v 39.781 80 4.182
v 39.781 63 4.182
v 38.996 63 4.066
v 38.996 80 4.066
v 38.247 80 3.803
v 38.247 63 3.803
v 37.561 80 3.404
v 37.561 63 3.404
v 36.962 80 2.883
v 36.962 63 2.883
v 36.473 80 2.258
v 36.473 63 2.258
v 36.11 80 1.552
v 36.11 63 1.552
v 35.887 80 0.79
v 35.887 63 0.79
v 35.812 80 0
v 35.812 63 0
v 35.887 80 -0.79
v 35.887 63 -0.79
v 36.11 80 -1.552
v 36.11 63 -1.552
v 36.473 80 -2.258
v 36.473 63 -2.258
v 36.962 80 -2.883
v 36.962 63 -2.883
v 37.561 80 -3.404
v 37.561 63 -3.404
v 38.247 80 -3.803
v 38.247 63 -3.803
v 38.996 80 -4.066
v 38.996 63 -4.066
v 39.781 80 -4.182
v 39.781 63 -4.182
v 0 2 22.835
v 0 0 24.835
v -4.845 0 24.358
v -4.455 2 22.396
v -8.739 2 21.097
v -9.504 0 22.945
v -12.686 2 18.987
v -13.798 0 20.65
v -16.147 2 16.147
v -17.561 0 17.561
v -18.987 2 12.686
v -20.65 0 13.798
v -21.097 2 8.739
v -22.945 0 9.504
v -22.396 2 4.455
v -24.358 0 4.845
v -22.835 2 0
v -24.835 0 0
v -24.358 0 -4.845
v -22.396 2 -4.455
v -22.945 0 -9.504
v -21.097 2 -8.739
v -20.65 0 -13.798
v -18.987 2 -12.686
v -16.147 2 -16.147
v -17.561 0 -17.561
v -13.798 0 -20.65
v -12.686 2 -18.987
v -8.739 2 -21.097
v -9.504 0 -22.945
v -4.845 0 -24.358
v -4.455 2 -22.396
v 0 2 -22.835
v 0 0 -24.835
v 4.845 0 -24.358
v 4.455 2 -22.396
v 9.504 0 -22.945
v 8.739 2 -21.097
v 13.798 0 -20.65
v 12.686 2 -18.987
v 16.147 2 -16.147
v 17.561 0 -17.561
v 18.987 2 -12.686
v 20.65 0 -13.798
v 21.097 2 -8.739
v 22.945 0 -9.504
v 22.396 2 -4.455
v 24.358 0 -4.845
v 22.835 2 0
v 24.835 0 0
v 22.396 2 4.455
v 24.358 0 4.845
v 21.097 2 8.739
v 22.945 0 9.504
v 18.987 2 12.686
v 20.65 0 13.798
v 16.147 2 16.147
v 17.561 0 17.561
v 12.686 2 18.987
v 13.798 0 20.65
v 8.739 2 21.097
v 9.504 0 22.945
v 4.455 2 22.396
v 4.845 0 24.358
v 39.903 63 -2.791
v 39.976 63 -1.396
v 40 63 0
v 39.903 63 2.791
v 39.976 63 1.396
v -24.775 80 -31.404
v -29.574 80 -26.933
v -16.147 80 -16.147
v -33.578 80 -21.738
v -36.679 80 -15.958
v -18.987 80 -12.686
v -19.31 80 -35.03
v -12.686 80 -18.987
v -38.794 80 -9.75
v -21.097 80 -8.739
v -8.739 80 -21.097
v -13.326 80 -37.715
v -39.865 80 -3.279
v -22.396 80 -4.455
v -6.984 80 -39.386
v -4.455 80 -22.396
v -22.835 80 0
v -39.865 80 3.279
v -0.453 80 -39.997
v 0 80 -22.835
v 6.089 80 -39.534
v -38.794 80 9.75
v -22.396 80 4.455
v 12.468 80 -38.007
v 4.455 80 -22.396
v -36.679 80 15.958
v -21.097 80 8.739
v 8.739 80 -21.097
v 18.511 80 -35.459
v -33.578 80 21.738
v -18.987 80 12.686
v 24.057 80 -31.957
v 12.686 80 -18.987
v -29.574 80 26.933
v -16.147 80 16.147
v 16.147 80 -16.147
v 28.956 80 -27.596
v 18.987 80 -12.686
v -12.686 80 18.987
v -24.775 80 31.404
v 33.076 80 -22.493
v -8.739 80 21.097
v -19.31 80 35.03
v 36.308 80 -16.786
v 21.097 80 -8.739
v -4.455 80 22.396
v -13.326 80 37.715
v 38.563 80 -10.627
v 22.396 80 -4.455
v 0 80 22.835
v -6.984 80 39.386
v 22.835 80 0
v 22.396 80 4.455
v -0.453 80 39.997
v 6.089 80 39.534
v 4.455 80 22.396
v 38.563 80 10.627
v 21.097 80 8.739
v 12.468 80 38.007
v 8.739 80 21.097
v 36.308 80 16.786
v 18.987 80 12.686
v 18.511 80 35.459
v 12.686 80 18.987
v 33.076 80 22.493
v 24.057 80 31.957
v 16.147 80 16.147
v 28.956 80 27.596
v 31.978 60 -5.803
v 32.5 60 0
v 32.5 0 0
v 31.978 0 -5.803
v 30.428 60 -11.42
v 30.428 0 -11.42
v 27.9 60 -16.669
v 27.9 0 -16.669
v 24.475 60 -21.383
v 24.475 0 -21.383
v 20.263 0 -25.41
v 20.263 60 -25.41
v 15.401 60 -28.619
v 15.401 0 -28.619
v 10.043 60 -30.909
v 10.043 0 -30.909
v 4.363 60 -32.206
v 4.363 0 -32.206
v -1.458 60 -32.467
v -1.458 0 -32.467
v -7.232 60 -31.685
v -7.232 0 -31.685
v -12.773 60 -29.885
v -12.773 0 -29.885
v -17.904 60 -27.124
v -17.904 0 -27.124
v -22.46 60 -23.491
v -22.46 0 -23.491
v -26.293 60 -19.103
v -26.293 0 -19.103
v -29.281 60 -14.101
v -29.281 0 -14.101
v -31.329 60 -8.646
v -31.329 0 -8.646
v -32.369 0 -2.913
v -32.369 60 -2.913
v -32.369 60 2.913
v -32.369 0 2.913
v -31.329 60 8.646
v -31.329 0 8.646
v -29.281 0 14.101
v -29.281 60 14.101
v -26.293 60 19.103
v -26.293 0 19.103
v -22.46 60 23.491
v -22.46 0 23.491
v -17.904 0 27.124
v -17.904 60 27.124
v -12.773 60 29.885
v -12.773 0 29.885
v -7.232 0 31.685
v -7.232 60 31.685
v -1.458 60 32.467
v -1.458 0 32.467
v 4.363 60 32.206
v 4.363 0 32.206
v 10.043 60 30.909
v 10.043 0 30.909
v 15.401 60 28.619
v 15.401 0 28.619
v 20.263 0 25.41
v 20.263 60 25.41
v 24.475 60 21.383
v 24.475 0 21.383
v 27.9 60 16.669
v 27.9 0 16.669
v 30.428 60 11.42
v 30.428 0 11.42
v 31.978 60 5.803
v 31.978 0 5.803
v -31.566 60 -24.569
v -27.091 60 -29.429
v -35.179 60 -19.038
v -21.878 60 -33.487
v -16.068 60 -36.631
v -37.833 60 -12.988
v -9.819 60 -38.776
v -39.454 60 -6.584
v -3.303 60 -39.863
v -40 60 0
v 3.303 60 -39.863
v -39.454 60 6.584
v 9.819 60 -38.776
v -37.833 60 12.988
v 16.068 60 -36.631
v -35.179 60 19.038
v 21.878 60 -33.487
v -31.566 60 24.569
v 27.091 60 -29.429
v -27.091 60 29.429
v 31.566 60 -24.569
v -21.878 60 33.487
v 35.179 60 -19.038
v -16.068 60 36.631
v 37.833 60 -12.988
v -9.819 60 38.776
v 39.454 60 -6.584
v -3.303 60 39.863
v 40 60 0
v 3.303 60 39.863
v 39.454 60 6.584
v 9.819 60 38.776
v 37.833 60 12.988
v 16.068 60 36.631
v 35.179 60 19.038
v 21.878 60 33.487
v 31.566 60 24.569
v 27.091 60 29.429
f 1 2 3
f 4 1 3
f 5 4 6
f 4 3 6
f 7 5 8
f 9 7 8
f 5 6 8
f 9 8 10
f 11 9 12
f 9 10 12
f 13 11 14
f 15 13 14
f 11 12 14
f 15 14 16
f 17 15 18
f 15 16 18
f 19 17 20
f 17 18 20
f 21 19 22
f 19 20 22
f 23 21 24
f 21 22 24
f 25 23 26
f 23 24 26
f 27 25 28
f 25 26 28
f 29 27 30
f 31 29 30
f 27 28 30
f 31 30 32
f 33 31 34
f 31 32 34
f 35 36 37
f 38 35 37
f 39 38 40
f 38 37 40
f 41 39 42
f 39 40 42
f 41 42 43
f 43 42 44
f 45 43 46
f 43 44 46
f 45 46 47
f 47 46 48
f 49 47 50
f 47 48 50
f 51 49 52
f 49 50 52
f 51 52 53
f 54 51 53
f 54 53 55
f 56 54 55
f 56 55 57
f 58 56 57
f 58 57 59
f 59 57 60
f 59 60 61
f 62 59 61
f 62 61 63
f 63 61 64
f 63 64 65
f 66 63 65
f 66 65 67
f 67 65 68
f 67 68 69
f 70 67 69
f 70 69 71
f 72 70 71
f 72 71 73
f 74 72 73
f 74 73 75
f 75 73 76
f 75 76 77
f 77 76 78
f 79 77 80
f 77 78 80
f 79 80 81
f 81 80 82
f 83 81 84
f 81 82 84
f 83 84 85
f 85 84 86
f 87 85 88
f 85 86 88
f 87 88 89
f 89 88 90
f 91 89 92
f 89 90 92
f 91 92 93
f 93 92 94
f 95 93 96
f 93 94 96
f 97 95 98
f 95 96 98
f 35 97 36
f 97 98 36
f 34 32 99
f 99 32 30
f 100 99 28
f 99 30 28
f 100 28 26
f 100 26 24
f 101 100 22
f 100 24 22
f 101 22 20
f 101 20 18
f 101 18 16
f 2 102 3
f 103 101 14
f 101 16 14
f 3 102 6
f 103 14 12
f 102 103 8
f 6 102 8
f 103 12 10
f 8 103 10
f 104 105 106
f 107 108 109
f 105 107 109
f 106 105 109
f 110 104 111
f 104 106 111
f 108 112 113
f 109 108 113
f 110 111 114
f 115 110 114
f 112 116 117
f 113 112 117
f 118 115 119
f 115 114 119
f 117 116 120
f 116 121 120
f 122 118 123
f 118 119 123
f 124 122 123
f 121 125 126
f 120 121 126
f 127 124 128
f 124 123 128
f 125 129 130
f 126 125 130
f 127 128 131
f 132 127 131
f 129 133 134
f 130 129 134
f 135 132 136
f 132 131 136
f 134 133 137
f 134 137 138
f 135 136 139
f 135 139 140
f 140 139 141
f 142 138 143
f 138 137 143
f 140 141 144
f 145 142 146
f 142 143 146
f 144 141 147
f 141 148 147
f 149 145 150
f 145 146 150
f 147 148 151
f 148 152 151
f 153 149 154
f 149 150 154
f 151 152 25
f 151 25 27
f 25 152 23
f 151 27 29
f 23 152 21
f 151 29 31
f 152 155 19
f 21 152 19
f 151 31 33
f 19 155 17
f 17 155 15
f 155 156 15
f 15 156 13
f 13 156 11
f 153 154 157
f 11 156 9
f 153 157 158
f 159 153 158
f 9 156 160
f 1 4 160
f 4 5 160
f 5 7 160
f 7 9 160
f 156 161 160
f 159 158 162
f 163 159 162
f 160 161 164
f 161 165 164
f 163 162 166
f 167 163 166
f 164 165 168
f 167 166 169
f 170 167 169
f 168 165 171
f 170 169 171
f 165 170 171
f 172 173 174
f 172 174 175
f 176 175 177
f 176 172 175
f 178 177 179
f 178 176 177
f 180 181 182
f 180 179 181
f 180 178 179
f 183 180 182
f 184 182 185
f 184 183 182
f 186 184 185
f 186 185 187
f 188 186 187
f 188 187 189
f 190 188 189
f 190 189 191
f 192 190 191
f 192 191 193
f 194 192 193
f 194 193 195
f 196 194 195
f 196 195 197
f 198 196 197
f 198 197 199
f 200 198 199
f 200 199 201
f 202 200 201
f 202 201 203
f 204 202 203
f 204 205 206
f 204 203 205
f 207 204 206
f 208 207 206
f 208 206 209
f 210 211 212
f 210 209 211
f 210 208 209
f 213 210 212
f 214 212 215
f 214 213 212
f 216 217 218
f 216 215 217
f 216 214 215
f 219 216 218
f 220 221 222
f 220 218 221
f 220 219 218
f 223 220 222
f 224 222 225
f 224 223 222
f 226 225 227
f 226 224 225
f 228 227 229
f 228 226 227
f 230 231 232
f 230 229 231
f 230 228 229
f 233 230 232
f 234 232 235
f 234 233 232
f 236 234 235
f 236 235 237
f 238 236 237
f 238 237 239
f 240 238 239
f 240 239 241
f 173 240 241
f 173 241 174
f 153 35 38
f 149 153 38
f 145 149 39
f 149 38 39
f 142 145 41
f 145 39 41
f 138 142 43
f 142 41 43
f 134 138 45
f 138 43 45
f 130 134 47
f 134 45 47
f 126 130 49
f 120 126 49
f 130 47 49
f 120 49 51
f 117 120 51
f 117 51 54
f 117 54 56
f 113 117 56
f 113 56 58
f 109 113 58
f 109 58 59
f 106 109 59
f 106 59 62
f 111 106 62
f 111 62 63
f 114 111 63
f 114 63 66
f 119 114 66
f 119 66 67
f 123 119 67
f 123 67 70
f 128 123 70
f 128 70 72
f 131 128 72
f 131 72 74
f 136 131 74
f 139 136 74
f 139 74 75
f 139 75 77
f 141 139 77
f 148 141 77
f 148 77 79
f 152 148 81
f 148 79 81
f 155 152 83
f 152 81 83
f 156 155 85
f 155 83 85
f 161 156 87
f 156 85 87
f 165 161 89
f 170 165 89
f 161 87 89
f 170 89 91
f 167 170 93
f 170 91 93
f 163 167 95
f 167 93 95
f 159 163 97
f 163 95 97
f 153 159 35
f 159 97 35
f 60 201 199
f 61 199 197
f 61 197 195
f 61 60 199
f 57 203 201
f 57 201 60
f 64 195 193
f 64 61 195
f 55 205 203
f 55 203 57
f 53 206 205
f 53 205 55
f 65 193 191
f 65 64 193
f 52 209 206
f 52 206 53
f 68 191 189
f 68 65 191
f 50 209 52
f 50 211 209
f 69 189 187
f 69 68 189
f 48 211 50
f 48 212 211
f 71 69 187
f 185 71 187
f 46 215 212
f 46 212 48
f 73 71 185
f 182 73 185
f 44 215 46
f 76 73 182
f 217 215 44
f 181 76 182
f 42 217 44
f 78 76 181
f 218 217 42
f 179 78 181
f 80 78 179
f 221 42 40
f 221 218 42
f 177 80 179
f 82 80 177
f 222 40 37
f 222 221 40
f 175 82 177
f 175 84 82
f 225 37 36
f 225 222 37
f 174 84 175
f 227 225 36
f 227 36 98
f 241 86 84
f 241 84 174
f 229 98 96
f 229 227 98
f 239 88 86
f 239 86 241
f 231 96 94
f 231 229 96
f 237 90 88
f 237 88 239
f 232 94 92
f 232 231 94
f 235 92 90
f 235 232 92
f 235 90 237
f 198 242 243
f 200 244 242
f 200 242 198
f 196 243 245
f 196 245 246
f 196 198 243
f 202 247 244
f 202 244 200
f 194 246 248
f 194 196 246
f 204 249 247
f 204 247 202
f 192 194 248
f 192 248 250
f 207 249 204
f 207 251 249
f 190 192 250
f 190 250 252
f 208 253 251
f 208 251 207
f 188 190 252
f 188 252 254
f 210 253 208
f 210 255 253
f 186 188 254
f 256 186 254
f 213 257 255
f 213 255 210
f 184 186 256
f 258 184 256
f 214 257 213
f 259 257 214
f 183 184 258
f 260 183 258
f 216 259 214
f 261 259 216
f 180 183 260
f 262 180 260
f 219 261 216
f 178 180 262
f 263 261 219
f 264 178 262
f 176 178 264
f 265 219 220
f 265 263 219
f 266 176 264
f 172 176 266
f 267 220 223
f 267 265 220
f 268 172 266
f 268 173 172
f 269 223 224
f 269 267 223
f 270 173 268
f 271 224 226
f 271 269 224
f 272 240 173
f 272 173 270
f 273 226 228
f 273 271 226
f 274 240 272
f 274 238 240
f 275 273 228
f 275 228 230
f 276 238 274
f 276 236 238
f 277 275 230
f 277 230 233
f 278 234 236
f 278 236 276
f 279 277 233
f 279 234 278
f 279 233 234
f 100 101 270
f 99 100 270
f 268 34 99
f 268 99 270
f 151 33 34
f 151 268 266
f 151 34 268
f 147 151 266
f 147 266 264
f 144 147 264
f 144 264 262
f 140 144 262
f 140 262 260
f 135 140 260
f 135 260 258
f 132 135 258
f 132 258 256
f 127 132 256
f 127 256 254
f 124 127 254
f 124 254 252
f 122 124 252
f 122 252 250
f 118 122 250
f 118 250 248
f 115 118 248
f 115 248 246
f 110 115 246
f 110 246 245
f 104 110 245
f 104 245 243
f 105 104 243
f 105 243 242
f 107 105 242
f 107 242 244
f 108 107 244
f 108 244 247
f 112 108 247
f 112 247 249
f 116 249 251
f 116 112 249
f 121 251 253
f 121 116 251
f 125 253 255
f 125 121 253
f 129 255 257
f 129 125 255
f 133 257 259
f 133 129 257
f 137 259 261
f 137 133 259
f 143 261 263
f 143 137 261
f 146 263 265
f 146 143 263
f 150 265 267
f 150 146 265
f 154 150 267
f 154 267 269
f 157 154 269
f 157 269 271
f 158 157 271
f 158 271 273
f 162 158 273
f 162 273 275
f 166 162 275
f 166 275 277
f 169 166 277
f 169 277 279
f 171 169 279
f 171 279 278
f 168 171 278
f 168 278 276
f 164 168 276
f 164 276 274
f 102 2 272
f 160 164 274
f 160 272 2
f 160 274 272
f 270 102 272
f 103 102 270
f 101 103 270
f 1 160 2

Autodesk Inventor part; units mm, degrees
ref_plane "YZ Plane" through (0, 0, 0) normal (1, 0, 0) x (0, 1, 0)
ref_plane "XZ Plane" through (0, 0, 0) normal (0, 1, 0) x (-1, 0, 0)
ref_plane "XY Plane" through (0, 0, 0) normal (0, 0, 1) x (1, 0, 0)
sketch "草图1" plane through (0, 0, 0) normal (0, 0, 1) x (1, 0, 0)
  line L0 (0, 0) -> (32.5, 0)
  line L1 (32.5, 0) -> (32.5, 60)
  line L2 (32.5, 60) -> (40, 60)
  line L3 (40, 60) -> (40, 80)
  line L4 (40, 80) -> (0, 80)
  line L5 (0, 80) -> (0, 0)
  dimension "d0" = 32.5
  dimension "d1" = 60
  dimension "d2" = 7.5
  dimension "d3" = 20
revolve "旋转1" add sketch "草图1" angle 360 about axis through (0, 80, 0) along (0, -1, 0)
sketch "草图2" plane through (0, 80, 0) normal (0, 1, 0) x (1, 0, 0)
  circle A0 centre (0, 0) radius 40 projected
hole "孔1" at (0, 80, 0) direction (0, -1, 0) diameter 45.6699 end through all thread size "M50x4" class "6H" standard "GB Metric profile"
chamfer "倒角1" distance 2 angle 45 1 edges at (0, 0, -22.8349)
sketch "草图3" plane through (0, 80, 0) normal (0, 1, 0) x (1, 0, 0)
  circle A0 centre (0, 0) radius 40 projected
  point P0 (40, 0)
hole "孔2" at (40, 80, 0) direction (0, -1, 0) diameter 8.376 depth 17 thread size "M10x1.5" designation "M10" class "6H" standard "GB Metric profile"
properties part number "螺套"
